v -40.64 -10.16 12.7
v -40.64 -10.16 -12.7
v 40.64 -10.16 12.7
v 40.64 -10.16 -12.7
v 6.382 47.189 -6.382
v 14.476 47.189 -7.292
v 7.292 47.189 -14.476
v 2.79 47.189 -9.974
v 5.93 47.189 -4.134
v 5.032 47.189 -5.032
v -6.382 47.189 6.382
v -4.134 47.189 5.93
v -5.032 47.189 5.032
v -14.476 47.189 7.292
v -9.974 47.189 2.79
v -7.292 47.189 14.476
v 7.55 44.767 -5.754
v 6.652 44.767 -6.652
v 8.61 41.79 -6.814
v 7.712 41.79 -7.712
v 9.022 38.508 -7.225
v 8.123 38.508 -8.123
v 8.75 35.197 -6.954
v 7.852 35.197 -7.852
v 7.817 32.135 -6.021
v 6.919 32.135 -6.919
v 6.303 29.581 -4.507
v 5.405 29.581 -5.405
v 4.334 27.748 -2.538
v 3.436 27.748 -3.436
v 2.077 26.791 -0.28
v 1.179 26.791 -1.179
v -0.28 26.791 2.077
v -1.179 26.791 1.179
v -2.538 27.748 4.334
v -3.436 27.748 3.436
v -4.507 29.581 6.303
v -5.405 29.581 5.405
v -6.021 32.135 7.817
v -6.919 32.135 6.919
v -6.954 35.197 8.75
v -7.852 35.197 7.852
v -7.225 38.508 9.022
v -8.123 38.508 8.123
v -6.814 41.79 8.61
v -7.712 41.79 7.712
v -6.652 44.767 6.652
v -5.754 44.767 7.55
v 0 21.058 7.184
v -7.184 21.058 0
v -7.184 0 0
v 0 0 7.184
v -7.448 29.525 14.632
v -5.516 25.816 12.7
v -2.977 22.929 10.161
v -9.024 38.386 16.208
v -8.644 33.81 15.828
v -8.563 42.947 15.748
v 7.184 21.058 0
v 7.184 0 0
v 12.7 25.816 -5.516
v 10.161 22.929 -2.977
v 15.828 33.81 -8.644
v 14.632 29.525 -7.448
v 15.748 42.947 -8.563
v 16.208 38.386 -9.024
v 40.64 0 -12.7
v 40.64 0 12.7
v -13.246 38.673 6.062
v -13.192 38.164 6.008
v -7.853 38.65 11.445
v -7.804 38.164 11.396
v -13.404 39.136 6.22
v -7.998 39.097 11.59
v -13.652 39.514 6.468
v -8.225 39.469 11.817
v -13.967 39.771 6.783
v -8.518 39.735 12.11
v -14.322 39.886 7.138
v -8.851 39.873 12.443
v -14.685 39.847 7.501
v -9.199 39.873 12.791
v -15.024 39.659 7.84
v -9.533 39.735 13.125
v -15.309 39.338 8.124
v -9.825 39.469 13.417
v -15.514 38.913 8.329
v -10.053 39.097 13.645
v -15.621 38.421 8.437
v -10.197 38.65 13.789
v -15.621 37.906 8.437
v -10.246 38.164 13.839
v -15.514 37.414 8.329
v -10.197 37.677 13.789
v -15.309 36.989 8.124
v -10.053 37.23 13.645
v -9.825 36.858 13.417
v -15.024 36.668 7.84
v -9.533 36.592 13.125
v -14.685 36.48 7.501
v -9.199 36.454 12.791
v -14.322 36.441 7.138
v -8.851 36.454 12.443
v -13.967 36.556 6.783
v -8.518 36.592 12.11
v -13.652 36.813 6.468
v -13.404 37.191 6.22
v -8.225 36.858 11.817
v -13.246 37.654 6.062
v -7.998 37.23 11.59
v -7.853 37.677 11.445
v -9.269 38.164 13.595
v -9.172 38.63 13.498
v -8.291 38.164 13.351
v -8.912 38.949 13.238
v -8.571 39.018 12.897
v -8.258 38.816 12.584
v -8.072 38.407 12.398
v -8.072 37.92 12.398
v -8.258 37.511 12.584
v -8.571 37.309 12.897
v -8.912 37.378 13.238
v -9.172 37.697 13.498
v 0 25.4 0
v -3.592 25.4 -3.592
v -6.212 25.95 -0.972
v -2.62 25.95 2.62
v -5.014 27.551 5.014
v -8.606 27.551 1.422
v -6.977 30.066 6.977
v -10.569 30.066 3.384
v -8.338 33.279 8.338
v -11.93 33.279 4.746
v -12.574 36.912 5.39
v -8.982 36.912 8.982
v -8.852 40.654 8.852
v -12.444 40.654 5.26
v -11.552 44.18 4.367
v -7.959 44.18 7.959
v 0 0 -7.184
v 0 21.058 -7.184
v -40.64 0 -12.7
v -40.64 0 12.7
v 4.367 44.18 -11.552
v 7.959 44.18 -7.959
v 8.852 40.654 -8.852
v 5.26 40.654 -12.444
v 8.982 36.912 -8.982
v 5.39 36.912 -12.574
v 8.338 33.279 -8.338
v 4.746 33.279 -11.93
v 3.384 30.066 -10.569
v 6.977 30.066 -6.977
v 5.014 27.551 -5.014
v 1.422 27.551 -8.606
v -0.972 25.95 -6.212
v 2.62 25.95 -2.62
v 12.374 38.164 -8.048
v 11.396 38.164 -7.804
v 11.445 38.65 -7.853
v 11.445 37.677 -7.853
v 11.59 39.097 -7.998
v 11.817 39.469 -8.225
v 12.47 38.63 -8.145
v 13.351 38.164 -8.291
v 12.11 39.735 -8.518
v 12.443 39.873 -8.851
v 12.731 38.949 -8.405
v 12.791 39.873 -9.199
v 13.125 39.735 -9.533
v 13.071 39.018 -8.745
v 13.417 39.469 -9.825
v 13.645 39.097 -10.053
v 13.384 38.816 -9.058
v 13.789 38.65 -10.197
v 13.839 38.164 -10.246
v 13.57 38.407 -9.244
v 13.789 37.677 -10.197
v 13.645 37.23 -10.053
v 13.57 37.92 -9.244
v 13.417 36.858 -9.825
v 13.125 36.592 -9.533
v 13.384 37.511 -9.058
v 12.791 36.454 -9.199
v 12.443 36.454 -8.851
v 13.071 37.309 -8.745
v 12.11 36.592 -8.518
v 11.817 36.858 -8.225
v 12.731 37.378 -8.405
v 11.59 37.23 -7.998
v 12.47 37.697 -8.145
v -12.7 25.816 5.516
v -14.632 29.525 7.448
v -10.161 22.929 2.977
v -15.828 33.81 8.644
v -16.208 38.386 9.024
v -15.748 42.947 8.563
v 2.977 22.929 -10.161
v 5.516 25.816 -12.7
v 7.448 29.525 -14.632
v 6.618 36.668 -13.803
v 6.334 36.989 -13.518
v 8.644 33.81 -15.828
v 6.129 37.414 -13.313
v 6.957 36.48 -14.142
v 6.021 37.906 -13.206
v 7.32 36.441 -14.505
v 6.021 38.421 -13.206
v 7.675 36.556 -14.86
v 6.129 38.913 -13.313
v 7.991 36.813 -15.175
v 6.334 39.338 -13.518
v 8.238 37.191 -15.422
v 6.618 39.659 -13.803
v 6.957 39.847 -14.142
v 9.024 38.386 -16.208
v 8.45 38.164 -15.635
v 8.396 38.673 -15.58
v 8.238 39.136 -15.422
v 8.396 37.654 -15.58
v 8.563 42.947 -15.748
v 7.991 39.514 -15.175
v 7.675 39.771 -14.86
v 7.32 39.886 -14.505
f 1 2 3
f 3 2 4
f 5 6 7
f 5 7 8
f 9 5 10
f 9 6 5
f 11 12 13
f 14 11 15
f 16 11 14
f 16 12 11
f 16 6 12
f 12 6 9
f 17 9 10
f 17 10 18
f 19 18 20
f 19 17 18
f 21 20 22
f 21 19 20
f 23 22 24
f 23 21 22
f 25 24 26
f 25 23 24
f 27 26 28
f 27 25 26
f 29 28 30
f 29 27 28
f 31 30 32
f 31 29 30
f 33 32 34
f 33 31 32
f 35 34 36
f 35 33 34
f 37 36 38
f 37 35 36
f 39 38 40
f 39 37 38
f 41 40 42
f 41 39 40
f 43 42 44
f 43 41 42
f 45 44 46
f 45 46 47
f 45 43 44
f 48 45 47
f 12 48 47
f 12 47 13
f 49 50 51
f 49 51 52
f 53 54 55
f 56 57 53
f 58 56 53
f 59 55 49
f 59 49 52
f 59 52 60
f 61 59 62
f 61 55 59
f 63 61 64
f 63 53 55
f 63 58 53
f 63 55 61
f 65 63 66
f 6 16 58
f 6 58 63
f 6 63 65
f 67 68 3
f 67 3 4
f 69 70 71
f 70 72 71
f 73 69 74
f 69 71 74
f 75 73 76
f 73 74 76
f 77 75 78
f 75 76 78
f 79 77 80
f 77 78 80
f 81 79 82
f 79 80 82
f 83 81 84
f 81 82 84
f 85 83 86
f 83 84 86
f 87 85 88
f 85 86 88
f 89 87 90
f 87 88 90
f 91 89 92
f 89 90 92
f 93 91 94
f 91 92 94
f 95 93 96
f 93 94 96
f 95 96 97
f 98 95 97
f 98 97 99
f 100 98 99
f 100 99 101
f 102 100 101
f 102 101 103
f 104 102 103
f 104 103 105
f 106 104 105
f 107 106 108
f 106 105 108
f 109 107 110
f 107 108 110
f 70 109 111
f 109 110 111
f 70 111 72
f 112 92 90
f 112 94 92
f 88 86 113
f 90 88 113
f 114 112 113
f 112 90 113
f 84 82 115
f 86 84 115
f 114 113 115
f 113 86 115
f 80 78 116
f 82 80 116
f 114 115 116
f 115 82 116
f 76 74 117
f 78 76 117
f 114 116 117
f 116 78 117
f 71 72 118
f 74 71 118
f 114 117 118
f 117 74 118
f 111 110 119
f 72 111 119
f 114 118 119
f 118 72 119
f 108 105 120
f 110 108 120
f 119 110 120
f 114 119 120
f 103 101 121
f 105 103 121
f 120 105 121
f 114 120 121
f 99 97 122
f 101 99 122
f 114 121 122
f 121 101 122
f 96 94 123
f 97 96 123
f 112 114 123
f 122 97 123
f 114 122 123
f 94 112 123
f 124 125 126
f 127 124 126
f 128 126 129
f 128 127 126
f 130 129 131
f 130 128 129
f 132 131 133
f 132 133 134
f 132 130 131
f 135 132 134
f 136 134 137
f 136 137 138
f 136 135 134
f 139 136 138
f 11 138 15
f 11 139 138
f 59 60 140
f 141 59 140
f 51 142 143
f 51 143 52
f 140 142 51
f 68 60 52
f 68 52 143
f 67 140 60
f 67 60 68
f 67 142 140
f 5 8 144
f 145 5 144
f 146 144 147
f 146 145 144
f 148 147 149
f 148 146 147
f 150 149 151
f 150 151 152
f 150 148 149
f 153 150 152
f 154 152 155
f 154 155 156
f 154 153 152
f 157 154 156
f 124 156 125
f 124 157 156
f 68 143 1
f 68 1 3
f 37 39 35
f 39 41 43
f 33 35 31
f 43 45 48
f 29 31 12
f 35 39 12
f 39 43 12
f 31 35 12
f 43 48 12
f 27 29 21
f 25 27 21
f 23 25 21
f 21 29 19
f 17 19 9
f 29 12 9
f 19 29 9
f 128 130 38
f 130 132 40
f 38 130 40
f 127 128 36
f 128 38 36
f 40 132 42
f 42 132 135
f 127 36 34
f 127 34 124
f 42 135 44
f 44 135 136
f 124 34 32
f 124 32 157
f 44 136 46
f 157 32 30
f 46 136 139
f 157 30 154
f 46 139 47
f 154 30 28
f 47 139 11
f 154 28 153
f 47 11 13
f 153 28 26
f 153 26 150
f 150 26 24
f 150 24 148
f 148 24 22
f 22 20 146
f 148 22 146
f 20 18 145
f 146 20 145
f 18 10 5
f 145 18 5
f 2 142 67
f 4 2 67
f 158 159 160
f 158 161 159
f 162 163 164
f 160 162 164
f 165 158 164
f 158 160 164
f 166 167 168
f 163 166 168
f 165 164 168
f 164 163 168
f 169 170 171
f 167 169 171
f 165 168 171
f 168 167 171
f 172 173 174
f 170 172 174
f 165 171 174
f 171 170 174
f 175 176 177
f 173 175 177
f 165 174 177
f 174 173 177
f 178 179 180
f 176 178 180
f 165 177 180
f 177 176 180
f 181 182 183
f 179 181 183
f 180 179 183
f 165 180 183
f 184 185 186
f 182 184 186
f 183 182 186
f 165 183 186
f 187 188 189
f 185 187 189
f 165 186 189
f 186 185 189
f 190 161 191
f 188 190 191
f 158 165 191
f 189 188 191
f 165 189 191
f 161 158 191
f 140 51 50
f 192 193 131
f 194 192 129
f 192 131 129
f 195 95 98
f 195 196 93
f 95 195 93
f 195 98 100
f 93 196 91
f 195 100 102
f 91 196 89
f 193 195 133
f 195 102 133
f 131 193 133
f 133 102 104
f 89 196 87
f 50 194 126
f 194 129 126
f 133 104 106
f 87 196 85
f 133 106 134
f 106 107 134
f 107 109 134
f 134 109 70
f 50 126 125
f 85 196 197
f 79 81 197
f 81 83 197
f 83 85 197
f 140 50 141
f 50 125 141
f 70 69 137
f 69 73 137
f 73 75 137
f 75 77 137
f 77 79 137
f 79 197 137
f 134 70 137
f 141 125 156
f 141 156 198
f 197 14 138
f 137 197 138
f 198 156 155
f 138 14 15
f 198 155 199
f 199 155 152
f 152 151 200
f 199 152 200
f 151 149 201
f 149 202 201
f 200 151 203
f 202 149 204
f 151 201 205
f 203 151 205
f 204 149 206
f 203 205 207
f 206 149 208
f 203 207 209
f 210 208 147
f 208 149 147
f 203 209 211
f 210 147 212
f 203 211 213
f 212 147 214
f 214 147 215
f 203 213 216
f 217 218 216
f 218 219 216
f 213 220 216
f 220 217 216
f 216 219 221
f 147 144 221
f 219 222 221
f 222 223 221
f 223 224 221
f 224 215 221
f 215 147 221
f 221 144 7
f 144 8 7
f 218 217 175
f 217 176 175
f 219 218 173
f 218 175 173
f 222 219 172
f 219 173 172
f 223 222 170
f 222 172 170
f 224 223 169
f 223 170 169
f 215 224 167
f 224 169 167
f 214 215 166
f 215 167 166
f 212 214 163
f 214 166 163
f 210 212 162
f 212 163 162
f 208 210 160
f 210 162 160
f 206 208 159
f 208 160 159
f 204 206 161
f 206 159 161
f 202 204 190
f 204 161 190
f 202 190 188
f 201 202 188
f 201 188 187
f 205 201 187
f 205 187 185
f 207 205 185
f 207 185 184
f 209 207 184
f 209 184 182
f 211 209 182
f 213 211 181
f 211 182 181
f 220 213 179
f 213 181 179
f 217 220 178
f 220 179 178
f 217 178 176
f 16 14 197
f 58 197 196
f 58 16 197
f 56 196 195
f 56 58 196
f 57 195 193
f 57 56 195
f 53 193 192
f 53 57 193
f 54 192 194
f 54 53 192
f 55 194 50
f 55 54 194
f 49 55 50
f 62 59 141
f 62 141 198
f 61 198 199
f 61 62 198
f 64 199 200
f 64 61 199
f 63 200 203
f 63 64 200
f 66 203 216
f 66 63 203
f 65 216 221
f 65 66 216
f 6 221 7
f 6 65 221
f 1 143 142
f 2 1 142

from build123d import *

# Parameters (mm, degrees)
SKETCH1_W                 = 81.28
SKETCH1_H                 = 25.4
BOSS_EXTRUDE1_DEPTH       = 10.16
BOSS_EXTRUDE2_DEPTH       = 25.4
BOSS_EXTRUDE3_DEPTH       = 10.16
BOSS_EXTRUDE4_DEPTH       = 3.81
BOSS_EXTRUDE5_DEPTH       = 5.08
F_8_32_TAPPED_HOLE2_D     = 3.4544
F_8_32_TAPPED_HOLE2_DEPTH = 7.62
F_8_32_TAPPED_HOLE2_TIP   = 1.037806461


with BuildPart() as part:
    # Sketch1 → Boss-Extrude1 (new body)
    # profile 1 of 2: a face of its own
    with BuildSketch(Plane(origin=(0, 0, 0), x_dir=(1, 0, 0), z_dir=(0, 1, 0))):
        Rectangle(SKETCH1_W, SKETCH1_H)
        Polygon((7.184204897, 0), (0, 7.184204897), (-7.184204897, 0), (0, -7.184204897), align=None, mode=Mode.SUBTRACT)
    # profile 2 of 2: a face of its own
    with BuildSketch(Plane(origin=(0, 0, 0), x_dir=(1, 0, 0), z_dir=(0, 1, 0))):
        Polygon((0, -7.184204897), (7.184204897, 0), (0, 7.184204897), (-7.184204897, 0), align=None)
    extrude(amount=-BOSS_EXTRUDE1_DEPTH)

    # Sketch1<3> → Boss-Extrude2 (add)
    with BuildSketch(Plane(origin=(0, 0, 0), x_dir=(1, 0, 0), z_dir=(0, 1, 0))):
        Polygon((0, -7.184204897), (7.184204897, 0), (0, 7.184204897), (-7.184204897, 0), align=None)
    extrude(amount=BOSS_EXTRUDE2_DEPTH)

    # Sketch3 → Boss-Extrude3 (add)
    with BuildSketch(Plane(origin=(3.592102448, 0, 3.592102448), x_dir=(0.7071067811865472, 0, -0.7071067811865479), z_dir=(0.7071067811865479, 0, 0.7071067811865472))):
        with BuildLine():
            ThreePointArc((0, 25.4), (-11.791936413, 33.279120011), (-9.025157402, 47.188657402))
            Line((-9.025157402, 47.188657402), (-15.392758886, 47.188657402))
            ThreePointArc((-15.392758886, 47.188657402), (0, 20.32), (15.392758886, 47.188657402))
            Line((15.392758886, 47.188657402), (9.025157402, 47.188657402))
            ThreePointArc((9.025157402, 47.188657402), (11.791936413, 33.279120011), (0, 25.4))
        make_face()
    extrude(amount=-BOSS_EXTRUDE3_DEPTH)

    # Sketch3<3> → Boss-Extrude4 (add)
    with BuildSketch(Plane(origin=(3.592102448, 0, 3.592102448), x_dir=(0.7071067811865472, 0, -0.7071067811865479), z_dir=(0.7071067811865479, 0, 0.7071067811865472))):
        with BuildLine():
            Line((15.392758886, 47.188657402), (-15.392758886, 47.188657402))
            ThreePointArc((-15.392758886, 47.188657402), (0, 20.32), (15.392758886, 47.188657402))
        make_face()
    extrude(amount=-BOSS_EXTRUDE4_DEPTH)

    # Sketch3<4> → Boss-Extrude5 (add)
    with BuildSketch(Plane(origin=(3.592102448, 0, 3.592102448), x_dir=(0.7071067811865472, 0, -0.7071067811865479), z_dir=(0.7071067811865479, 0, 0.7071067811865472))):
        with BuildLine():
            Line((-7.116675918, 47.188657402), (-9.025157402, 47.188657402))
            ThreePointArc((-9.025157402, 47.188657402), (-11.791936413, 33.279120011), (0, 25.4))
            ThreePointArc((0, 25.4), (11.791936413, 33.279120011), (9.025157402, 47.188657402))
            Line((9.025157402, 47.188657402), (7.116675918, 47.188657402))
            ThreePointArc((7.116675918, 47.188657402), (0, 26.67), (-7.116675918, 47.188657402))
        make_face()
    extrude(amount=-BOSS_EXTRUDE5_DEPTH)

    # #8-32 Tapped Hole2
    with Locations(Plane(origin=(-3.592102448, 0, -3.592102448), x_dir=(-0.7071067811865472, 0, 0.7071067811865479), z_dir=(-0.7071067811865479, 0, -0.7071067811865472))):
        with Locations((15.3035, 38.1635), (-15.3035, 38.1635)):
            Hole(F_8_32_TAPPED_HOLE2_D / 2, depth=F_8_32_TAPPED_HOLE2_DEPTH)
            with Locations((0, 0, -(F_8_32_TAPPED_HOLE2_DEPTH + F_8_32_TAPPED_HOLE2_TIP / 2))):  # 118° drill point
                Cone(0, F_8_32_TAPPED_HOLE2_D / 2, F_8_32_TAPPED_HOLE2_TIP, mode=Mode.SUBTRACT)


solid = part.part
